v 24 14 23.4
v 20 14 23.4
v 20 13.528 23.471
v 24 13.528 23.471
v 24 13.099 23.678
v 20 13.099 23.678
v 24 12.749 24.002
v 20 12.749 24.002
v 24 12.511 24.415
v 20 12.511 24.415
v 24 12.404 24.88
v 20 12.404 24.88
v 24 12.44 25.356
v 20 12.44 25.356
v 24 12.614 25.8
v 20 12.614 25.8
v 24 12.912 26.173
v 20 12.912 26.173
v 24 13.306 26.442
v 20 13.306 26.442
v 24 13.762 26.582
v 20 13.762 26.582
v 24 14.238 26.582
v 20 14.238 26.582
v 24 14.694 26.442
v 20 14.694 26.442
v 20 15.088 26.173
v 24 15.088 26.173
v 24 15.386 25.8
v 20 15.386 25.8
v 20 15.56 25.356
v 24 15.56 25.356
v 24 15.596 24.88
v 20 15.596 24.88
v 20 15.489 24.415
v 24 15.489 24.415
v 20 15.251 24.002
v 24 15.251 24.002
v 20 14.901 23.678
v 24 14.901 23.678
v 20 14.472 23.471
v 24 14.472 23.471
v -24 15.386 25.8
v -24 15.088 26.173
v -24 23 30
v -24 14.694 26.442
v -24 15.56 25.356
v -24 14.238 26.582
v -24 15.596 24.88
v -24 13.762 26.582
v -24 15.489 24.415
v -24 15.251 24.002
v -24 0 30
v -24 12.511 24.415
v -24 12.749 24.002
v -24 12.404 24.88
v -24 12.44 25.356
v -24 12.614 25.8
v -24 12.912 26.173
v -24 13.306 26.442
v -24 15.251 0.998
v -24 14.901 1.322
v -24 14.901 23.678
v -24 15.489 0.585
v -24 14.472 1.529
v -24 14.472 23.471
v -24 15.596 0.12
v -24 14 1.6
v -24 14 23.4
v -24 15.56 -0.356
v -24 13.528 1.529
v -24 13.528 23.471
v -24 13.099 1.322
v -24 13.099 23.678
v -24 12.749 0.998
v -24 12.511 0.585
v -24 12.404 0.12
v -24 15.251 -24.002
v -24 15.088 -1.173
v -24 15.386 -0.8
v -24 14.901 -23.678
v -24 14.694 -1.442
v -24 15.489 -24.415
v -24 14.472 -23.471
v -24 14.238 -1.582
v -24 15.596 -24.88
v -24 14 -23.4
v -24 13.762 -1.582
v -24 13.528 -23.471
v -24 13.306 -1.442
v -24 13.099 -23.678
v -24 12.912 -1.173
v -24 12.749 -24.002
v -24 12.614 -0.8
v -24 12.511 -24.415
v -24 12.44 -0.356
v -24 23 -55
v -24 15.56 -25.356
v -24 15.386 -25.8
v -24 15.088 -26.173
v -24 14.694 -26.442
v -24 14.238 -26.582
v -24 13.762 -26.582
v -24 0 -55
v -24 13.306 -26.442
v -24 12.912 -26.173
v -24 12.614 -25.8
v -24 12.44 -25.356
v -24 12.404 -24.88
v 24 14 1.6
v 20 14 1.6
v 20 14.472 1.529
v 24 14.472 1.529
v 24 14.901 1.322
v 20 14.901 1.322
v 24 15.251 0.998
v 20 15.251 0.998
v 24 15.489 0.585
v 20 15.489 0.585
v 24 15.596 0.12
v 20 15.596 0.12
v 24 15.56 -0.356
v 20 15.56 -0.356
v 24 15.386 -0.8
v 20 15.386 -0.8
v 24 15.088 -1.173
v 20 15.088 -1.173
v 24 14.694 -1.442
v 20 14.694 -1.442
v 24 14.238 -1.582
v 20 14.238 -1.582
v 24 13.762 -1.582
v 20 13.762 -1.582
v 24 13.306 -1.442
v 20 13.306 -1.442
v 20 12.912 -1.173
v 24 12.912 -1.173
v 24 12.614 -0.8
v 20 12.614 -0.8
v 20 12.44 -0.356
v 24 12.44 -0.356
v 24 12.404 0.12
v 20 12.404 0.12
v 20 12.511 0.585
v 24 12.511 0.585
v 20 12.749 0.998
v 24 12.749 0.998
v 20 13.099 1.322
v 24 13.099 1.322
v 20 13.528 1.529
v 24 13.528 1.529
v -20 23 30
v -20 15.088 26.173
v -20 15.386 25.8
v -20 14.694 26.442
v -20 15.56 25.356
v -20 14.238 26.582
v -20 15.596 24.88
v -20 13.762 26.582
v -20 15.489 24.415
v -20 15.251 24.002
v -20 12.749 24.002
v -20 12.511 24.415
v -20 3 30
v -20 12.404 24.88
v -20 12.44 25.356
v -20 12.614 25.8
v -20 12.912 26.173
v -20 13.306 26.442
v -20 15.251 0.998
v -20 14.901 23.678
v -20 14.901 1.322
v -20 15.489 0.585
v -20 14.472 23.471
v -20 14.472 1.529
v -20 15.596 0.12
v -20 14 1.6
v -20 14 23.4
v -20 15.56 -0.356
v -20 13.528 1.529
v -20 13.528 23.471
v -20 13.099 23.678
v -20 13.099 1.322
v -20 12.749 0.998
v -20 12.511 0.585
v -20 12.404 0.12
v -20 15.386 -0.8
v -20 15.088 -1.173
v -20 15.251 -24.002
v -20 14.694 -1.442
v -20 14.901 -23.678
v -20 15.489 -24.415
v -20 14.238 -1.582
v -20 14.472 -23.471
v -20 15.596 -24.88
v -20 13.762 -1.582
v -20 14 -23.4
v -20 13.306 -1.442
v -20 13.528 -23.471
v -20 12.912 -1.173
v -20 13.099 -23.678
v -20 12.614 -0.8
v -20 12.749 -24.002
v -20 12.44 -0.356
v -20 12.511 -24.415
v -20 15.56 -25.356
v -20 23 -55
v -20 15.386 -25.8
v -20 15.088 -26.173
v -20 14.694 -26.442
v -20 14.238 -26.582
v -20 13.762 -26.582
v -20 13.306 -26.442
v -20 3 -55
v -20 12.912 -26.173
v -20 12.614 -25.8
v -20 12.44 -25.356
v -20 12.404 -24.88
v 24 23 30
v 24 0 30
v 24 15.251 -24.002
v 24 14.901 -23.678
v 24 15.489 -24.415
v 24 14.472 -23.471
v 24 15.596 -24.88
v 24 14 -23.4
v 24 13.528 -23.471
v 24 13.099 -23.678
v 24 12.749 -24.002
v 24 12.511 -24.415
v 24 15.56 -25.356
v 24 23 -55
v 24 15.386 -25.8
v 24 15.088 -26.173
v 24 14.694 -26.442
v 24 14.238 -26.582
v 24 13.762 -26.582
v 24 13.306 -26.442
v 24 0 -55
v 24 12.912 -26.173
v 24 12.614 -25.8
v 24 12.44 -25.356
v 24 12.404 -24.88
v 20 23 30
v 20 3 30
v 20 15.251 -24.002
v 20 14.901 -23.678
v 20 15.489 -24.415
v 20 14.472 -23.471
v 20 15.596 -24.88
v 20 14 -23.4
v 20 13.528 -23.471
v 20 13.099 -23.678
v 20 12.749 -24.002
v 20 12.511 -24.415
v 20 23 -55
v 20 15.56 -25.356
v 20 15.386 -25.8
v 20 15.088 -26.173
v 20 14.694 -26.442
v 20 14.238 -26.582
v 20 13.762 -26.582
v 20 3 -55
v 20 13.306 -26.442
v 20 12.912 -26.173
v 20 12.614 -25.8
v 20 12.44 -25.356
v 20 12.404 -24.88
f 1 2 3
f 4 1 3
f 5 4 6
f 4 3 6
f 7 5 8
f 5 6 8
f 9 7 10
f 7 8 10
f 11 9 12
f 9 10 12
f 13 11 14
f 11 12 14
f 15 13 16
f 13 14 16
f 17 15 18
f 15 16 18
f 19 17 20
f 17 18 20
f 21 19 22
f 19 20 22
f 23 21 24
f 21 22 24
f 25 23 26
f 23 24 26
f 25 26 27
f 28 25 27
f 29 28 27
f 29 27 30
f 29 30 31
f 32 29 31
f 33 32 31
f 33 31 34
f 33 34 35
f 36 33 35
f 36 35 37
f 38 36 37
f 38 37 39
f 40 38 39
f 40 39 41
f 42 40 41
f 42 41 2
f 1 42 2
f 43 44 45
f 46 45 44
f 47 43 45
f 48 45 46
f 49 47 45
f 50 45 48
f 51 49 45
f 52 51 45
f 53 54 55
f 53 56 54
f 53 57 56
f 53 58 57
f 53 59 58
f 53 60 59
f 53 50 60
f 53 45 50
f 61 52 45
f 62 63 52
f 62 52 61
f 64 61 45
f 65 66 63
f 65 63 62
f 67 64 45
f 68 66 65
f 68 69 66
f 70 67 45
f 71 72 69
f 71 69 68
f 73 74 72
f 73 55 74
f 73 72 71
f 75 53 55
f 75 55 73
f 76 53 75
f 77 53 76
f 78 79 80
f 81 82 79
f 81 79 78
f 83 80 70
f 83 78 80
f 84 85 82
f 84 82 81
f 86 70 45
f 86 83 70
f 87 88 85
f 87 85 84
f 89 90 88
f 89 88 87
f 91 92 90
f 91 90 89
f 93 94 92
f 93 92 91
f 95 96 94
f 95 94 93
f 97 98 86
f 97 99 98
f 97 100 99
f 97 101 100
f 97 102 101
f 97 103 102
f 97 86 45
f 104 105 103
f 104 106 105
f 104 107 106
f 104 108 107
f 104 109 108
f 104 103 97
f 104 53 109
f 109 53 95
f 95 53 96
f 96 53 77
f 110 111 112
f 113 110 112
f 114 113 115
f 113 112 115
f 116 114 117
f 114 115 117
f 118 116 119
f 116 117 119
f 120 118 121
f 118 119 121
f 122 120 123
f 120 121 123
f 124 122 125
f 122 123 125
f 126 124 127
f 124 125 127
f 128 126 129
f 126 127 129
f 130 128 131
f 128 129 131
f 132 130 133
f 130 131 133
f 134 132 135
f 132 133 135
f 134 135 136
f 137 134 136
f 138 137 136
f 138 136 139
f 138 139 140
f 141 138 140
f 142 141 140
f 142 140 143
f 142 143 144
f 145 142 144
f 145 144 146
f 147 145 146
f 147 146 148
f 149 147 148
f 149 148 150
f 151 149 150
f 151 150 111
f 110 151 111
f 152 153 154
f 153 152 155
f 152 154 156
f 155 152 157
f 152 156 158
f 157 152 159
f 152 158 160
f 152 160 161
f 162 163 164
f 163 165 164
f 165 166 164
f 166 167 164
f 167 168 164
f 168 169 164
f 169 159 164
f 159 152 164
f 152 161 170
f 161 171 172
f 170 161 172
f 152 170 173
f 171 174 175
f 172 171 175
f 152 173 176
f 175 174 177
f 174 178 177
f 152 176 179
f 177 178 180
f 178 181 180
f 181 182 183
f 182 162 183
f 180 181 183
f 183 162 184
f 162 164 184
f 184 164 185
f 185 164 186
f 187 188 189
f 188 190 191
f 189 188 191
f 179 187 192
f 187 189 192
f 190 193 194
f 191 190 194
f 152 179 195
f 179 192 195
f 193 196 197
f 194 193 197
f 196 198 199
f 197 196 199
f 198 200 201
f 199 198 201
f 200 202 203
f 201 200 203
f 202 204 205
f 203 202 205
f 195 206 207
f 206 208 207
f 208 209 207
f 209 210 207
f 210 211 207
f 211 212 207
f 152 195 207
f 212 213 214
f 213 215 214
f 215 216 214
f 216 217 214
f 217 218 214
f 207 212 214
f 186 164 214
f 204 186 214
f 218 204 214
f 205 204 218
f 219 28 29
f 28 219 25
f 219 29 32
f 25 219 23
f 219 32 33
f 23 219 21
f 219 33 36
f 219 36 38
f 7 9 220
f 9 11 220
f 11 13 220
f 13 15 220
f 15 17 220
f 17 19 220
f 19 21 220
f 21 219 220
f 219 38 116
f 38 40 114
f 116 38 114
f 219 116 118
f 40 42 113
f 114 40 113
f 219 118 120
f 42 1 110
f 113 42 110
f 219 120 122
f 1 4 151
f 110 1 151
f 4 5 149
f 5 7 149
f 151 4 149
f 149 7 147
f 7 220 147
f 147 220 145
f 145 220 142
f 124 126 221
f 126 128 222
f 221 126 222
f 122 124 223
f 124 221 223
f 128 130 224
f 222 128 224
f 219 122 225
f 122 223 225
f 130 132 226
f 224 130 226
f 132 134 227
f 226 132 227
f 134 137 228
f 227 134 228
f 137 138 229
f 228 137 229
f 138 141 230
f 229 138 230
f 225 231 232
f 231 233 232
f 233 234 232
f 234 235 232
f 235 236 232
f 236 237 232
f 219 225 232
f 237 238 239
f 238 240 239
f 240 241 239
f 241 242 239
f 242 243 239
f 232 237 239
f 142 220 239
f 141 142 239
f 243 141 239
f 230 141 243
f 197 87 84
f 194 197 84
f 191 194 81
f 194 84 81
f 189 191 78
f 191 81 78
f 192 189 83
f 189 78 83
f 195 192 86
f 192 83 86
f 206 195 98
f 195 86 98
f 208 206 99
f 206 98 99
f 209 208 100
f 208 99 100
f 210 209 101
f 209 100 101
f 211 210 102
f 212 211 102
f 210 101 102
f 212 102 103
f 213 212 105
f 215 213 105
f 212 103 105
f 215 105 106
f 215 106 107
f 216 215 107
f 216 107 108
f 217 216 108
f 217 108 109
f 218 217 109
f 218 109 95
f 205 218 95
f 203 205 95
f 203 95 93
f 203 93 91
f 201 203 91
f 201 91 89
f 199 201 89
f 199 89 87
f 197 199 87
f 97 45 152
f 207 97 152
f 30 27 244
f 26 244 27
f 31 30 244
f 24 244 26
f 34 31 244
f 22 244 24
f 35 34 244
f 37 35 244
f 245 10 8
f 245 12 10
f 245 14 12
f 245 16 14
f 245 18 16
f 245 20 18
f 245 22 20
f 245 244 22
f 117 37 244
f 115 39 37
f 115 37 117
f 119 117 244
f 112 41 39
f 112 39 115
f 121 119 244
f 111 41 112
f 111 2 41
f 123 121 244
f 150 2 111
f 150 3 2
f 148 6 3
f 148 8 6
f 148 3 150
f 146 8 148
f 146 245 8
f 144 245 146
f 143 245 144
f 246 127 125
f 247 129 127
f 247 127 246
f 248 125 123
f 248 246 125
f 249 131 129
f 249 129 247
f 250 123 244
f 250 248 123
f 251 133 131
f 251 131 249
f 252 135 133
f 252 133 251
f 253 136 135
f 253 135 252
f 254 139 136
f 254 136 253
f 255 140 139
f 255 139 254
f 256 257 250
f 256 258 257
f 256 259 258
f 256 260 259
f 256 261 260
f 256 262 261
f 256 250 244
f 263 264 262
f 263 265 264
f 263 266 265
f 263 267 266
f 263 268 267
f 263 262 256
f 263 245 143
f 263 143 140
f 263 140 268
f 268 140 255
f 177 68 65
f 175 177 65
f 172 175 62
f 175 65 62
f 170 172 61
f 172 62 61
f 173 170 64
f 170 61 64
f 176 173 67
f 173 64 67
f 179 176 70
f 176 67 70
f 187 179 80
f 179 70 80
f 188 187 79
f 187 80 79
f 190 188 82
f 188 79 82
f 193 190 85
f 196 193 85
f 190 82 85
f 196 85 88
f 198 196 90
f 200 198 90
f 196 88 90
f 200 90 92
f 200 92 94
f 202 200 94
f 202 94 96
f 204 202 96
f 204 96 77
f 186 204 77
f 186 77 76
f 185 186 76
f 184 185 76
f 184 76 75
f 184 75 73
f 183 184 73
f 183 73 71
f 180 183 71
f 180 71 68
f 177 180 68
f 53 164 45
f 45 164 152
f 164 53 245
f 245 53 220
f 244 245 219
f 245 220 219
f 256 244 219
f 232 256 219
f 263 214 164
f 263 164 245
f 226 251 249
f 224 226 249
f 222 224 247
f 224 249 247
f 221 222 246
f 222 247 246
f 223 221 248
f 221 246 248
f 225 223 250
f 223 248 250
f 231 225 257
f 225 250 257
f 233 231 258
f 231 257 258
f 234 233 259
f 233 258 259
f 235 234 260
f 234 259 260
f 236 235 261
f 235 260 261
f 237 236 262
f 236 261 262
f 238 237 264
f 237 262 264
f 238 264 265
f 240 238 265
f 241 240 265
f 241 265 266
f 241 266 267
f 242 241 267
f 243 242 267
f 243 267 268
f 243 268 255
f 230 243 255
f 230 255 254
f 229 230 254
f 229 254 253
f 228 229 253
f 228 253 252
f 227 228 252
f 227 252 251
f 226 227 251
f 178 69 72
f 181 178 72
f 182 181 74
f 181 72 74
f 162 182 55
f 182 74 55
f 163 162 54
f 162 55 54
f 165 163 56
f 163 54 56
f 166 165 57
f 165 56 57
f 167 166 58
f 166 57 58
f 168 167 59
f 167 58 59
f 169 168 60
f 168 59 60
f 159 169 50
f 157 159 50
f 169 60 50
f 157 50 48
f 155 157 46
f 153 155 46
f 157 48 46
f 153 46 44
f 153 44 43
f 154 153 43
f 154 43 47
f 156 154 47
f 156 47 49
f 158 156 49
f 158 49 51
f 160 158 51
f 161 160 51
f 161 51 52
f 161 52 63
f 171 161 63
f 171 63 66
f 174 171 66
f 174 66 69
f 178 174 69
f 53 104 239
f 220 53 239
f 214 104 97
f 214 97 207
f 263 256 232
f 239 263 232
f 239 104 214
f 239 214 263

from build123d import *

# Parameters (mm, degrees)
SKETCH_2_W          = 48
SKETCH_2_H          = 110
EXTRUDE_1_DEPTH     = 3
SKETCH_3_W          = 4
SKETCH_3_H          = 110
EXTRUDE_2_DEPTH     = 20
SKETCH_4_R          = 1.6
CUT_EXTRUDE_1_DEPTH = 77.537572473
SKETCH_5_W          = 25
SKETCH_5_H          = 23
CUT_EXTRUDE_2_DEPTH = 77.537572473


with BuildPart() as part:
    # 草图2 → 凸台-拉伸1 (new body)
    with BuildSketch(Plane(origin=(0, 0, 0), x_dir=(1, 0, 0), z_dir=(0, 1, 0))):
        Rectangle(SKETCH_2_W, SKETCH_2_H)
    extrude(amount=EXTRUDE_1_DEPTH)

    # 草图3 → 凸台-拉伸2 (add)
    with BuildSketch(Plane(origin=(0, 3, 0), x_dir=(1, 0, 0), z_dir=(0, 1, 0))):
        with Locations((-22, 0)):
            Rectangle(SKETCH_3_W, SKETCH_3_H)
        with Locations((22, 0)):
            Rectangle(SKETCH_3_W, SKETCH_3_H)
    extrude(amount=EXTRUDE_2_DEPTH)

    # 草图4 → 切除-拉伸1 (cut, through all)
    with BuildSketch(Plane.ZY.offset(24)):
        with Locations((0, 14)):
            Circle(SKETCH_4_R)
        with Locations((-25, 14)):
            Circle(SKETCH_4_R)
        with Locations(Location((25, 14, 0), (0, 0, 180))):
            Circle(SKETCH_4_R)
    extrude(amount=-CUT_EXTRUDE_1_DEPTH, mode=Mode.SUBTRACT)

    # 草图5 → 切除-拉伸2 (cut, through all)
    with BuildSketch(Plane(origin=(24, 0, 0), x_dir=(0, 0, -1), z_dir=(1, 0, 0))):
        with Locations((-42.5, 11.5)):
            Rectangle(SKETCH_5_W, SKETCH_5_H)
    extrude(amount=-CUT_EXTRUDE_2_DEPTH, mode=Mode.SUBTRACT)


solid = part.part
